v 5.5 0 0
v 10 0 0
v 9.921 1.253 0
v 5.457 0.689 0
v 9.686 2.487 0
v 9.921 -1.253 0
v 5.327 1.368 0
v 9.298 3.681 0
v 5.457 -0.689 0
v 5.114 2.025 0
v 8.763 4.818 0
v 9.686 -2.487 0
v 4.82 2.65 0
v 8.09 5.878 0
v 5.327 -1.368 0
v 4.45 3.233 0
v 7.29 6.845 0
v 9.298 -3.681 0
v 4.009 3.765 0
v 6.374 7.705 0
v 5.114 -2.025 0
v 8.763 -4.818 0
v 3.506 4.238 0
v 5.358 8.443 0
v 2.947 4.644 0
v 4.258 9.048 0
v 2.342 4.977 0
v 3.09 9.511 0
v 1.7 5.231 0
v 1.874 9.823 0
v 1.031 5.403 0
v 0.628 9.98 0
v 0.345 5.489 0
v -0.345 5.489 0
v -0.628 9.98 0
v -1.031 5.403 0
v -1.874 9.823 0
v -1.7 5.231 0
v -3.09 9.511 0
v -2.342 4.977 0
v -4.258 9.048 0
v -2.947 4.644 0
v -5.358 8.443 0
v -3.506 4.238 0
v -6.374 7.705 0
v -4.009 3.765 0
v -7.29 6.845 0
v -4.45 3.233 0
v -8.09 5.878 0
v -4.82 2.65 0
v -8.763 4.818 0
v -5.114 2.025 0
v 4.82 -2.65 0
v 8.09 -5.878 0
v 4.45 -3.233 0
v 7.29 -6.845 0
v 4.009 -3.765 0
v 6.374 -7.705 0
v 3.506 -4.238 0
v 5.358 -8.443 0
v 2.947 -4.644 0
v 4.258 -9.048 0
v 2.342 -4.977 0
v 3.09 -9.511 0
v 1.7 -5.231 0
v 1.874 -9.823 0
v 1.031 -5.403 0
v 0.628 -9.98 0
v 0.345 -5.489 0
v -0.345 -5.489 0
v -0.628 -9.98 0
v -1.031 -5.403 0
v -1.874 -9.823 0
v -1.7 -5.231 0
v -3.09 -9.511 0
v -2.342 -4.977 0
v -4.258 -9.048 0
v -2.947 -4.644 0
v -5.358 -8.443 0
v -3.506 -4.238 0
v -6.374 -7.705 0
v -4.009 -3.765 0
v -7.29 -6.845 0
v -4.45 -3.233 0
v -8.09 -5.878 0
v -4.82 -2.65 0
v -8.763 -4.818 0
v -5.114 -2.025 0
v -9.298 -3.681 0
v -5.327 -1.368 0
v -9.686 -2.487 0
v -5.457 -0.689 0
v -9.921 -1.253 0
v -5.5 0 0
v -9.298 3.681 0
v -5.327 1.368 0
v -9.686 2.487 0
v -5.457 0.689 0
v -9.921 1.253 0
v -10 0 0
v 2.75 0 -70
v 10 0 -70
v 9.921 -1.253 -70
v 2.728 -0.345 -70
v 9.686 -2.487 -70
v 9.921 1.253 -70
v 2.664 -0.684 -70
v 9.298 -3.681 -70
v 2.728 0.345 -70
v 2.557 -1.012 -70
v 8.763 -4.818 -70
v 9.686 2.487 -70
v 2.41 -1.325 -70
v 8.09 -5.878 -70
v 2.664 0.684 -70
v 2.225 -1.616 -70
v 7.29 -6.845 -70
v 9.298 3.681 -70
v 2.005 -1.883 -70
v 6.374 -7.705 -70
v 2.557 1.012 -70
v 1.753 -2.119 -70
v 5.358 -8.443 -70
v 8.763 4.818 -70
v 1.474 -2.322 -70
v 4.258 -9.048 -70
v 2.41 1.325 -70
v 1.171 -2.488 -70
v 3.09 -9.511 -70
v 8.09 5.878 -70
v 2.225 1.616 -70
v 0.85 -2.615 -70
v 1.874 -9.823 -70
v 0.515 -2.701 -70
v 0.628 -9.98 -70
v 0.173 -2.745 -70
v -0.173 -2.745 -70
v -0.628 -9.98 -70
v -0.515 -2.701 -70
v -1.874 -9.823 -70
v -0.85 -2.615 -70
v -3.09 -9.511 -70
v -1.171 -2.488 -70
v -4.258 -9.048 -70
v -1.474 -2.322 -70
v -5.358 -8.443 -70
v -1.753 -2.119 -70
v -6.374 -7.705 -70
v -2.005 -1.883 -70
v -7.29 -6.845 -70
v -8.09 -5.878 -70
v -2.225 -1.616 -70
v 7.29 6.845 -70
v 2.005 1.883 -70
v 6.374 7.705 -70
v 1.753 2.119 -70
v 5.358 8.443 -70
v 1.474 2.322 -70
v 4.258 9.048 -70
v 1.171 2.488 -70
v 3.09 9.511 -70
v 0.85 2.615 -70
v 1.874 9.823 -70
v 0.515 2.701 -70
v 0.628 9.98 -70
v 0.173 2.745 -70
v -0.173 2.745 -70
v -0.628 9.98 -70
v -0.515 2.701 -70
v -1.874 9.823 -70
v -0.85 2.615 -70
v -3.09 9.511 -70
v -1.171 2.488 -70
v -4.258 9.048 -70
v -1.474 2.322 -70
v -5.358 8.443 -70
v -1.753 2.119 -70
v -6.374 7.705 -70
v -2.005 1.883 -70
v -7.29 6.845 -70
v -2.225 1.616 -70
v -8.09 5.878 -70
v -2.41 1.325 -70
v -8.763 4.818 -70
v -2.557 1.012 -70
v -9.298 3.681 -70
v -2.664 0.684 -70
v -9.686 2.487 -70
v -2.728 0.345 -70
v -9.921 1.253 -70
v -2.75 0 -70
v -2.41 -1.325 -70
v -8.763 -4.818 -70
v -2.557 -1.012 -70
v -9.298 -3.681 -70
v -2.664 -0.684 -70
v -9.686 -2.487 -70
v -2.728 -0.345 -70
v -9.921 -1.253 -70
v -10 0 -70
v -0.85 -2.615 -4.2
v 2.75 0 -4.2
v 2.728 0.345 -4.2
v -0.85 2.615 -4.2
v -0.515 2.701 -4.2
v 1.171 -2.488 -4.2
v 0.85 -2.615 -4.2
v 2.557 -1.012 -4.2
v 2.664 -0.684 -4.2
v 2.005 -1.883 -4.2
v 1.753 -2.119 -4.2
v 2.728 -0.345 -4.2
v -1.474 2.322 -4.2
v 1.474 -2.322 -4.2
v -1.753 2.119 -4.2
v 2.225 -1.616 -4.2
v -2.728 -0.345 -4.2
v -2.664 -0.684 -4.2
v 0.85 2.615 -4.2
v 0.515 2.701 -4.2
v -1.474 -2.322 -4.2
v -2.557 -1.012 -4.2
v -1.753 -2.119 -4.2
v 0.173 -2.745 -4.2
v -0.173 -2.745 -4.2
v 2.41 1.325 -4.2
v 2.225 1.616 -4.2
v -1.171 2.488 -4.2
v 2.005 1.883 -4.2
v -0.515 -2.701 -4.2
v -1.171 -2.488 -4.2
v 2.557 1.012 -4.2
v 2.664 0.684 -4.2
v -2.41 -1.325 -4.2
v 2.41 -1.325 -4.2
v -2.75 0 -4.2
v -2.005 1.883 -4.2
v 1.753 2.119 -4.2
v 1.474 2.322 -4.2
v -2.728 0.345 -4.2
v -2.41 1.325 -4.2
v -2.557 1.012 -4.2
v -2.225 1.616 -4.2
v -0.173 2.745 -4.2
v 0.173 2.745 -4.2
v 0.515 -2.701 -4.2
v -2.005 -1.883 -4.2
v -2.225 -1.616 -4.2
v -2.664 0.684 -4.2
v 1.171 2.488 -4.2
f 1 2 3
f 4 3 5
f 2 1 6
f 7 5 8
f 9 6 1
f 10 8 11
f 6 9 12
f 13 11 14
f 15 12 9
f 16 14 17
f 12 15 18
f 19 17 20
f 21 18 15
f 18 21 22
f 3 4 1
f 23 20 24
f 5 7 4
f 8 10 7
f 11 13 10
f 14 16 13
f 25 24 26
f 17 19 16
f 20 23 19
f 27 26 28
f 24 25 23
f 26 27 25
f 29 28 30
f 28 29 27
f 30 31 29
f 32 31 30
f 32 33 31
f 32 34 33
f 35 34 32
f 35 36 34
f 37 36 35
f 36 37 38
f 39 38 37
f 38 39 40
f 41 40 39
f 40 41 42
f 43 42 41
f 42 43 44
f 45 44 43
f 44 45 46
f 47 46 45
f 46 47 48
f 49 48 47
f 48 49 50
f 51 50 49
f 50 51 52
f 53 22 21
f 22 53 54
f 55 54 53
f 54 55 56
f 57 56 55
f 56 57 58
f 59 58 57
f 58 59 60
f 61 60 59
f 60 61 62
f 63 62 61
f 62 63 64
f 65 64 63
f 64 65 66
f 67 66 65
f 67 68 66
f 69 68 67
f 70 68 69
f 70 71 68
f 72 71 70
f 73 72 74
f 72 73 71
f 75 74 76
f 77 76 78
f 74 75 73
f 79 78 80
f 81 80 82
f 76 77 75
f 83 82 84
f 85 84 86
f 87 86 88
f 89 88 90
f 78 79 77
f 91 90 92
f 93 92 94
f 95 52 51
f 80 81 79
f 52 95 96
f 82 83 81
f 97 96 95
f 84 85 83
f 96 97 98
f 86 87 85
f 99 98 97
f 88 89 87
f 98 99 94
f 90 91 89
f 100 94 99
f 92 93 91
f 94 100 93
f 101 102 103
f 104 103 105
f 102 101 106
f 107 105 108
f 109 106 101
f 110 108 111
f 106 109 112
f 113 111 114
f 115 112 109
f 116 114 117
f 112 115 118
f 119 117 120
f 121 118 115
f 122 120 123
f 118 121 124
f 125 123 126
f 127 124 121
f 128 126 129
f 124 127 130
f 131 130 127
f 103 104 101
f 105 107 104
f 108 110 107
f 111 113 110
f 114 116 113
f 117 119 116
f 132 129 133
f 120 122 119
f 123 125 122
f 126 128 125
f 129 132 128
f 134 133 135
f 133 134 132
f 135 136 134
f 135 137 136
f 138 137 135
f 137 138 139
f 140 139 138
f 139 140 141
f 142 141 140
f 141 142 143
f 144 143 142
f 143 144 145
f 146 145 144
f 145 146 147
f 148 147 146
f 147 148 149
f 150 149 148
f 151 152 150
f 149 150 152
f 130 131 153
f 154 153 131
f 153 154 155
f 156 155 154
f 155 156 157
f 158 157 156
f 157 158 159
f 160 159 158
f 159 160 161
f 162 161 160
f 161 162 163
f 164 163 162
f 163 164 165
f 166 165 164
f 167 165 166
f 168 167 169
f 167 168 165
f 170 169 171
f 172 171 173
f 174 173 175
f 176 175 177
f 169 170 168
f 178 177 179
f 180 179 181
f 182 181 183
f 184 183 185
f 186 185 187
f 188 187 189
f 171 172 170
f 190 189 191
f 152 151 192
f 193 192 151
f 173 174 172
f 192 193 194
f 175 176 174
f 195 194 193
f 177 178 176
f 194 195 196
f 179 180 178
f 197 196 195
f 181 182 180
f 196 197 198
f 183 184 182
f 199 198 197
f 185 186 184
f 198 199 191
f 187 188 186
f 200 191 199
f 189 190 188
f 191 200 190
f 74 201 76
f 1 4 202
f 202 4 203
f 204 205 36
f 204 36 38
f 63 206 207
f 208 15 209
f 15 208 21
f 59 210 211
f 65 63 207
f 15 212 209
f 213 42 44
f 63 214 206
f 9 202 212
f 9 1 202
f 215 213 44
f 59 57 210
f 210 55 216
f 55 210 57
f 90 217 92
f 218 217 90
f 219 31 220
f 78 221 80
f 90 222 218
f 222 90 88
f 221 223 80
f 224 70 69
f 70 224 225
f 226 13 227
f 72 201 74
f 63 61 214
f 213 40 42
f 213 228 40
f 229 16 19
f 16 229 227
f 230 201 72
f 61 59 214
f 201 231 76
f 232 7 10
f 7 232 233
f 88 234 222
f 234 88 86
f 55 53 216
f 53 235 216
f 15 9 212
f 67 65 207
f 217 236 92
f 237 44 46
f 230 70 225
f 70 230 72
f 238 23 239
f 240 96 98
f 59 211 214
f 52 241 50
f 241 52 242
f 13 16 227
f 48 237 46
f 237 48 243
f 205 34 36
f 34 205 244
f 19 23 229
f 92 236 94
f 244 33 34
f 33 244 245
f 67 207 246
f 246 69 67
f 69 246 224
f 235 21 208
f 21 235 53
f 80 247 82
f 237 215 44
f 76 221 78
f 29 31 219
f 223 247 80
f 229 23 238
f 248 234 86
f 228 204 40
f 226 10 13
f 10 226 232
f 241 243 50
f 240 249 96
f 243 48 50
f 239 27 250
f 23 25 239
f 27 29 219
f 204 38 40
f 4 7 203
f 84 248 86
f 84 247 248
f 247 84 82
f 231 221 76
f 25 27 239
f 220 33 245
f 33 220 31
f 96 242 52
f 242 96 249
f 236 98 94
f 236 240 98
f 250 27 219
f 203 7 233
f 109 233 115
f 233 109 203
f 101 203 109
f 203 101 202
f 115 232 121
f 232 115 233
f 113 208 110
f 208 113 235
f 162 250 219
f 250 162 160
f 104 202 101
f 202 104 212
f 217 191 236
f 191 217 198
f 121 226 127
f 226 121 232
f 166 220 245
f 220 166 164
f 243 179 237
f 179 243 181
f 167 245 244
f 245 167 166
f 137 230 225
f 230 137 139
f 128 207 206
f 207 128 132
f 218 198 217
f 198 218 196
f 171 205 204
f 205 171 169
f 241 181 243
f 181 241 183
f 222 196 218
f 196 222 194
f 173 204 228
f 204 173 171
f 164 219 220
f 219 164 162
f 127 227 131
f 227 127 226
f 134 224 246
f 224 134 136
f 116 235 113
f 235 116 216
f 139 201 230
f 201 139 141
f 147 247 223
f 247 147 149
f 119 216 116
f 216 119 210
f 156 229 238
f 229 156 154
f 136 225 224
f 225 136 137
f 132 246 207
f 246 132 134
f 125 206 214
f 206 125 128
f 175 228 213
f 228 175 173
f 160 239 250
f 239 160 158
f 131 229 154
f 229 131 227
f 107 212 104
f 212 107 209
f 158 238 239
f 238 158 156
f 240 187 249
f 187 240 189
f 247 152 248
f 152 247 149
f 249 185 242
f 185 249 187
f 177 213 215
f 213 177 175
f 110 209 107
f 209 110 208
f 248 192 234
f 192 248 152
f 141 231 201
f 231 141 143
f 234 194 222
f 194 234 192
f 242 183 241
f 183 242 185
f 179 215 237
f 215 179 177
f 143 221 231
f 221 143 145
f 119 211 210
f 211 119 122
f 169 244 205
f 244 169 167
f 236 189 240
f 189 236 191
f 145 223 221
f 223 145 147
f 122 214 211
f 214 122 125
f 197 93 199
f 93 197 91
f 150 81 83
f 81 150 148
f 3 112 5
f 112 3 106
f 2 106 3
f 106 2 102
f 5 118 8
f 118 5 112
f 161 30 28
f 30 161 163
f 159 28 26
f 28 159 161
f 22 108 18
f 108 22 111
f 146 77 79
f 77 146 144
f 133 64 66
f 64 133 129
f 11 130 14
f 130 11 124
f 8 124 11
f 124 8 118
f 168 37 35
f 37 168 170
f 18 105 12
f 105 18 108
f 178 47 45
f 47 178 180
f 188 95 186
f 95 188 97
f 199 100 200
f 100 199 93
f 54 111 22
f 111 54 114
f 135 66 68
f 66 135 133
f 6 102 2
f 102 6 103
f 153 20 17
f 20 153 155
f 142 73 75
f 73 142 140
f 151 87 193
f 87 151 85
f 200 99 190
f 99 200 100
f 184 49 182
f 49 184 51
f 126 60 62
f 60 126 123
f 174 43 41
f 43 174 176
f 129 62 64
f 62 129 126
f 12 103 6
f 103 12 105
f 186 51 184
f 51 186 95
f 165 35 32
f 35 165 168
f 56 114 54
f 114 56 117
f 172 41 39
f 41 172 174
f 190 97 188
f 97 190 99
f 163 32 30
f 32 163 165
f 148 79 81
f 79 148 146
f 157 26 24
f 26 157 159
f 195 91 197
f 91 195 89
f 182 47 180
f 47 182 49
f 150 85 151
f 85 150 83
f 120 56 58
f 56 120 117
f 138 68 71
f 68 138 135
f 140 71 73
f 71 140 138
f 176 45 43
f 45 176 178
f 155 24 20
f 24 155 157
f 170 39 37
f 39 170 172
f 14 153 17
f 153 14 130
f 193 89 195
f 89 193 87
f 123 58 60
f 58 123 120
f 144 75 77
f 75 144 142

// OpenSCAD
$fn = 50;


difference() {
	union() {
		translate(v = [0, 0, -70.0000000000]) {
			cylinder(h = 70, r = 10.0000000000);
		}
	}
	union() {
		translate(v = [0, 0, 0]) {
			rotate(a = [0, 0, 0]) {
				difference() {
					union() {
						#translate(v = [0, 0, -70.0000000000]) {
							cylinder(h = 70, r = 2.2500000000);
						}
						#translate(v = [0, 0, -4.2000000000]) {
							cylinder(h = 4.2000000000, r1 = 2.7500000000, r2 = 5.5000000000);
						}
						#translate(v = [0, 0, -70.0000000000]) {
							cylinder(h = 70, r = 2.7500000000);
						}
						#translate(v = [0, 0, -70.0000000000]) {
							cylinder(h = 70, r = 2.2500000000);
						}
					}
					union();
				}
			}
		}
	}
}
